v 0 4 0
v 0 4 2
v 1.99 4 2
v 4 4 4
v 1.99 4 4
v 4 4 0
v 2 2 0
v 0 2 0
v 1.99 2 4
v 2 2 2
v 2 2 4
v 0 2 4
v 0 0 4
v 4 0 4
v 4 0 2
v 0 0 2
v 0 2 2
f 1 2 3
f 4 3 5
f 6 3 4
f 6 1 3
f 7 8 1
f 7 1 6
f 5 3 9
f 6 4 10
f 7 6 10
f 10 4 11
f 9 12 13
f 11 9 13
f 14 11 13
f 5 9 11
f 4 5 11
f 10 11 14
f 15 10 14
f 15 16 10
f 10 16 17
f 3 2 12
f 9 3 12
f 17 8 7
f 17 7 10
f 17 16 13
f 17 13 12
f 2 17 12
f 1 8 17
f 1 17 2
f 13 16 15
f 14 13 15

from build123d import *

# Parameters (mm, degrees)
SKETCH1_W           = 4
SKETCH1_H           = 4
BOSS_EXTRUDE1_DEPTH = 4
CUT_EXTRUDE1_DEPTH  = 4
CUT_EXTRUDE7_DEPTH  = 1.99
SKETCH6_W           = 2
SKETCH6_H           = 2
CUT_EXTRUDE8_DEPTH  = 21.99


with BuildPart() as part:
    # Sketch1 → Boss-Extrude1 (new body)
    with BuildSketch(Plane.XY):
        with Locations((2, 2)):
            Rectangle(SKETCH1_W, SKETCH1_H)
    extrude(amount=BOSS_EXTRUDE1_DEPTH)

    # Sketch2 → Cut-Extrude1 (cut)
    with BuildSketch(Plane.XY.offset(4)):
        Polygon((4, 4), (2, 2), (4, 0), align=None)
    extrude(amount=-CUT_EXTRUDE1_DEPTH, mode=Mode.SUBTRACT)

    # Sketch5 → Cut-Extrude7 (cut)
    with BuildSketch(Plane.ZY):
        Polygon((2, 4), (4, 2), (4, 4), align=None)
    extrude(amount=-CUT_EXTRUDE7_DEPTH, mode=Mode.SUBTRACT)

    # Sketch6 → Cut-Extrude8 (cut)
    with BuildSketch(Plane.ZY):
        with Locations((1, 1)):
            Rectangle(SKETCH6_W, SKETCH6_H)
    extrude(amount=-CUT_EXTRUDE8_DEPTH, mode=Mode.SUBTRACT)


solid = part.part
